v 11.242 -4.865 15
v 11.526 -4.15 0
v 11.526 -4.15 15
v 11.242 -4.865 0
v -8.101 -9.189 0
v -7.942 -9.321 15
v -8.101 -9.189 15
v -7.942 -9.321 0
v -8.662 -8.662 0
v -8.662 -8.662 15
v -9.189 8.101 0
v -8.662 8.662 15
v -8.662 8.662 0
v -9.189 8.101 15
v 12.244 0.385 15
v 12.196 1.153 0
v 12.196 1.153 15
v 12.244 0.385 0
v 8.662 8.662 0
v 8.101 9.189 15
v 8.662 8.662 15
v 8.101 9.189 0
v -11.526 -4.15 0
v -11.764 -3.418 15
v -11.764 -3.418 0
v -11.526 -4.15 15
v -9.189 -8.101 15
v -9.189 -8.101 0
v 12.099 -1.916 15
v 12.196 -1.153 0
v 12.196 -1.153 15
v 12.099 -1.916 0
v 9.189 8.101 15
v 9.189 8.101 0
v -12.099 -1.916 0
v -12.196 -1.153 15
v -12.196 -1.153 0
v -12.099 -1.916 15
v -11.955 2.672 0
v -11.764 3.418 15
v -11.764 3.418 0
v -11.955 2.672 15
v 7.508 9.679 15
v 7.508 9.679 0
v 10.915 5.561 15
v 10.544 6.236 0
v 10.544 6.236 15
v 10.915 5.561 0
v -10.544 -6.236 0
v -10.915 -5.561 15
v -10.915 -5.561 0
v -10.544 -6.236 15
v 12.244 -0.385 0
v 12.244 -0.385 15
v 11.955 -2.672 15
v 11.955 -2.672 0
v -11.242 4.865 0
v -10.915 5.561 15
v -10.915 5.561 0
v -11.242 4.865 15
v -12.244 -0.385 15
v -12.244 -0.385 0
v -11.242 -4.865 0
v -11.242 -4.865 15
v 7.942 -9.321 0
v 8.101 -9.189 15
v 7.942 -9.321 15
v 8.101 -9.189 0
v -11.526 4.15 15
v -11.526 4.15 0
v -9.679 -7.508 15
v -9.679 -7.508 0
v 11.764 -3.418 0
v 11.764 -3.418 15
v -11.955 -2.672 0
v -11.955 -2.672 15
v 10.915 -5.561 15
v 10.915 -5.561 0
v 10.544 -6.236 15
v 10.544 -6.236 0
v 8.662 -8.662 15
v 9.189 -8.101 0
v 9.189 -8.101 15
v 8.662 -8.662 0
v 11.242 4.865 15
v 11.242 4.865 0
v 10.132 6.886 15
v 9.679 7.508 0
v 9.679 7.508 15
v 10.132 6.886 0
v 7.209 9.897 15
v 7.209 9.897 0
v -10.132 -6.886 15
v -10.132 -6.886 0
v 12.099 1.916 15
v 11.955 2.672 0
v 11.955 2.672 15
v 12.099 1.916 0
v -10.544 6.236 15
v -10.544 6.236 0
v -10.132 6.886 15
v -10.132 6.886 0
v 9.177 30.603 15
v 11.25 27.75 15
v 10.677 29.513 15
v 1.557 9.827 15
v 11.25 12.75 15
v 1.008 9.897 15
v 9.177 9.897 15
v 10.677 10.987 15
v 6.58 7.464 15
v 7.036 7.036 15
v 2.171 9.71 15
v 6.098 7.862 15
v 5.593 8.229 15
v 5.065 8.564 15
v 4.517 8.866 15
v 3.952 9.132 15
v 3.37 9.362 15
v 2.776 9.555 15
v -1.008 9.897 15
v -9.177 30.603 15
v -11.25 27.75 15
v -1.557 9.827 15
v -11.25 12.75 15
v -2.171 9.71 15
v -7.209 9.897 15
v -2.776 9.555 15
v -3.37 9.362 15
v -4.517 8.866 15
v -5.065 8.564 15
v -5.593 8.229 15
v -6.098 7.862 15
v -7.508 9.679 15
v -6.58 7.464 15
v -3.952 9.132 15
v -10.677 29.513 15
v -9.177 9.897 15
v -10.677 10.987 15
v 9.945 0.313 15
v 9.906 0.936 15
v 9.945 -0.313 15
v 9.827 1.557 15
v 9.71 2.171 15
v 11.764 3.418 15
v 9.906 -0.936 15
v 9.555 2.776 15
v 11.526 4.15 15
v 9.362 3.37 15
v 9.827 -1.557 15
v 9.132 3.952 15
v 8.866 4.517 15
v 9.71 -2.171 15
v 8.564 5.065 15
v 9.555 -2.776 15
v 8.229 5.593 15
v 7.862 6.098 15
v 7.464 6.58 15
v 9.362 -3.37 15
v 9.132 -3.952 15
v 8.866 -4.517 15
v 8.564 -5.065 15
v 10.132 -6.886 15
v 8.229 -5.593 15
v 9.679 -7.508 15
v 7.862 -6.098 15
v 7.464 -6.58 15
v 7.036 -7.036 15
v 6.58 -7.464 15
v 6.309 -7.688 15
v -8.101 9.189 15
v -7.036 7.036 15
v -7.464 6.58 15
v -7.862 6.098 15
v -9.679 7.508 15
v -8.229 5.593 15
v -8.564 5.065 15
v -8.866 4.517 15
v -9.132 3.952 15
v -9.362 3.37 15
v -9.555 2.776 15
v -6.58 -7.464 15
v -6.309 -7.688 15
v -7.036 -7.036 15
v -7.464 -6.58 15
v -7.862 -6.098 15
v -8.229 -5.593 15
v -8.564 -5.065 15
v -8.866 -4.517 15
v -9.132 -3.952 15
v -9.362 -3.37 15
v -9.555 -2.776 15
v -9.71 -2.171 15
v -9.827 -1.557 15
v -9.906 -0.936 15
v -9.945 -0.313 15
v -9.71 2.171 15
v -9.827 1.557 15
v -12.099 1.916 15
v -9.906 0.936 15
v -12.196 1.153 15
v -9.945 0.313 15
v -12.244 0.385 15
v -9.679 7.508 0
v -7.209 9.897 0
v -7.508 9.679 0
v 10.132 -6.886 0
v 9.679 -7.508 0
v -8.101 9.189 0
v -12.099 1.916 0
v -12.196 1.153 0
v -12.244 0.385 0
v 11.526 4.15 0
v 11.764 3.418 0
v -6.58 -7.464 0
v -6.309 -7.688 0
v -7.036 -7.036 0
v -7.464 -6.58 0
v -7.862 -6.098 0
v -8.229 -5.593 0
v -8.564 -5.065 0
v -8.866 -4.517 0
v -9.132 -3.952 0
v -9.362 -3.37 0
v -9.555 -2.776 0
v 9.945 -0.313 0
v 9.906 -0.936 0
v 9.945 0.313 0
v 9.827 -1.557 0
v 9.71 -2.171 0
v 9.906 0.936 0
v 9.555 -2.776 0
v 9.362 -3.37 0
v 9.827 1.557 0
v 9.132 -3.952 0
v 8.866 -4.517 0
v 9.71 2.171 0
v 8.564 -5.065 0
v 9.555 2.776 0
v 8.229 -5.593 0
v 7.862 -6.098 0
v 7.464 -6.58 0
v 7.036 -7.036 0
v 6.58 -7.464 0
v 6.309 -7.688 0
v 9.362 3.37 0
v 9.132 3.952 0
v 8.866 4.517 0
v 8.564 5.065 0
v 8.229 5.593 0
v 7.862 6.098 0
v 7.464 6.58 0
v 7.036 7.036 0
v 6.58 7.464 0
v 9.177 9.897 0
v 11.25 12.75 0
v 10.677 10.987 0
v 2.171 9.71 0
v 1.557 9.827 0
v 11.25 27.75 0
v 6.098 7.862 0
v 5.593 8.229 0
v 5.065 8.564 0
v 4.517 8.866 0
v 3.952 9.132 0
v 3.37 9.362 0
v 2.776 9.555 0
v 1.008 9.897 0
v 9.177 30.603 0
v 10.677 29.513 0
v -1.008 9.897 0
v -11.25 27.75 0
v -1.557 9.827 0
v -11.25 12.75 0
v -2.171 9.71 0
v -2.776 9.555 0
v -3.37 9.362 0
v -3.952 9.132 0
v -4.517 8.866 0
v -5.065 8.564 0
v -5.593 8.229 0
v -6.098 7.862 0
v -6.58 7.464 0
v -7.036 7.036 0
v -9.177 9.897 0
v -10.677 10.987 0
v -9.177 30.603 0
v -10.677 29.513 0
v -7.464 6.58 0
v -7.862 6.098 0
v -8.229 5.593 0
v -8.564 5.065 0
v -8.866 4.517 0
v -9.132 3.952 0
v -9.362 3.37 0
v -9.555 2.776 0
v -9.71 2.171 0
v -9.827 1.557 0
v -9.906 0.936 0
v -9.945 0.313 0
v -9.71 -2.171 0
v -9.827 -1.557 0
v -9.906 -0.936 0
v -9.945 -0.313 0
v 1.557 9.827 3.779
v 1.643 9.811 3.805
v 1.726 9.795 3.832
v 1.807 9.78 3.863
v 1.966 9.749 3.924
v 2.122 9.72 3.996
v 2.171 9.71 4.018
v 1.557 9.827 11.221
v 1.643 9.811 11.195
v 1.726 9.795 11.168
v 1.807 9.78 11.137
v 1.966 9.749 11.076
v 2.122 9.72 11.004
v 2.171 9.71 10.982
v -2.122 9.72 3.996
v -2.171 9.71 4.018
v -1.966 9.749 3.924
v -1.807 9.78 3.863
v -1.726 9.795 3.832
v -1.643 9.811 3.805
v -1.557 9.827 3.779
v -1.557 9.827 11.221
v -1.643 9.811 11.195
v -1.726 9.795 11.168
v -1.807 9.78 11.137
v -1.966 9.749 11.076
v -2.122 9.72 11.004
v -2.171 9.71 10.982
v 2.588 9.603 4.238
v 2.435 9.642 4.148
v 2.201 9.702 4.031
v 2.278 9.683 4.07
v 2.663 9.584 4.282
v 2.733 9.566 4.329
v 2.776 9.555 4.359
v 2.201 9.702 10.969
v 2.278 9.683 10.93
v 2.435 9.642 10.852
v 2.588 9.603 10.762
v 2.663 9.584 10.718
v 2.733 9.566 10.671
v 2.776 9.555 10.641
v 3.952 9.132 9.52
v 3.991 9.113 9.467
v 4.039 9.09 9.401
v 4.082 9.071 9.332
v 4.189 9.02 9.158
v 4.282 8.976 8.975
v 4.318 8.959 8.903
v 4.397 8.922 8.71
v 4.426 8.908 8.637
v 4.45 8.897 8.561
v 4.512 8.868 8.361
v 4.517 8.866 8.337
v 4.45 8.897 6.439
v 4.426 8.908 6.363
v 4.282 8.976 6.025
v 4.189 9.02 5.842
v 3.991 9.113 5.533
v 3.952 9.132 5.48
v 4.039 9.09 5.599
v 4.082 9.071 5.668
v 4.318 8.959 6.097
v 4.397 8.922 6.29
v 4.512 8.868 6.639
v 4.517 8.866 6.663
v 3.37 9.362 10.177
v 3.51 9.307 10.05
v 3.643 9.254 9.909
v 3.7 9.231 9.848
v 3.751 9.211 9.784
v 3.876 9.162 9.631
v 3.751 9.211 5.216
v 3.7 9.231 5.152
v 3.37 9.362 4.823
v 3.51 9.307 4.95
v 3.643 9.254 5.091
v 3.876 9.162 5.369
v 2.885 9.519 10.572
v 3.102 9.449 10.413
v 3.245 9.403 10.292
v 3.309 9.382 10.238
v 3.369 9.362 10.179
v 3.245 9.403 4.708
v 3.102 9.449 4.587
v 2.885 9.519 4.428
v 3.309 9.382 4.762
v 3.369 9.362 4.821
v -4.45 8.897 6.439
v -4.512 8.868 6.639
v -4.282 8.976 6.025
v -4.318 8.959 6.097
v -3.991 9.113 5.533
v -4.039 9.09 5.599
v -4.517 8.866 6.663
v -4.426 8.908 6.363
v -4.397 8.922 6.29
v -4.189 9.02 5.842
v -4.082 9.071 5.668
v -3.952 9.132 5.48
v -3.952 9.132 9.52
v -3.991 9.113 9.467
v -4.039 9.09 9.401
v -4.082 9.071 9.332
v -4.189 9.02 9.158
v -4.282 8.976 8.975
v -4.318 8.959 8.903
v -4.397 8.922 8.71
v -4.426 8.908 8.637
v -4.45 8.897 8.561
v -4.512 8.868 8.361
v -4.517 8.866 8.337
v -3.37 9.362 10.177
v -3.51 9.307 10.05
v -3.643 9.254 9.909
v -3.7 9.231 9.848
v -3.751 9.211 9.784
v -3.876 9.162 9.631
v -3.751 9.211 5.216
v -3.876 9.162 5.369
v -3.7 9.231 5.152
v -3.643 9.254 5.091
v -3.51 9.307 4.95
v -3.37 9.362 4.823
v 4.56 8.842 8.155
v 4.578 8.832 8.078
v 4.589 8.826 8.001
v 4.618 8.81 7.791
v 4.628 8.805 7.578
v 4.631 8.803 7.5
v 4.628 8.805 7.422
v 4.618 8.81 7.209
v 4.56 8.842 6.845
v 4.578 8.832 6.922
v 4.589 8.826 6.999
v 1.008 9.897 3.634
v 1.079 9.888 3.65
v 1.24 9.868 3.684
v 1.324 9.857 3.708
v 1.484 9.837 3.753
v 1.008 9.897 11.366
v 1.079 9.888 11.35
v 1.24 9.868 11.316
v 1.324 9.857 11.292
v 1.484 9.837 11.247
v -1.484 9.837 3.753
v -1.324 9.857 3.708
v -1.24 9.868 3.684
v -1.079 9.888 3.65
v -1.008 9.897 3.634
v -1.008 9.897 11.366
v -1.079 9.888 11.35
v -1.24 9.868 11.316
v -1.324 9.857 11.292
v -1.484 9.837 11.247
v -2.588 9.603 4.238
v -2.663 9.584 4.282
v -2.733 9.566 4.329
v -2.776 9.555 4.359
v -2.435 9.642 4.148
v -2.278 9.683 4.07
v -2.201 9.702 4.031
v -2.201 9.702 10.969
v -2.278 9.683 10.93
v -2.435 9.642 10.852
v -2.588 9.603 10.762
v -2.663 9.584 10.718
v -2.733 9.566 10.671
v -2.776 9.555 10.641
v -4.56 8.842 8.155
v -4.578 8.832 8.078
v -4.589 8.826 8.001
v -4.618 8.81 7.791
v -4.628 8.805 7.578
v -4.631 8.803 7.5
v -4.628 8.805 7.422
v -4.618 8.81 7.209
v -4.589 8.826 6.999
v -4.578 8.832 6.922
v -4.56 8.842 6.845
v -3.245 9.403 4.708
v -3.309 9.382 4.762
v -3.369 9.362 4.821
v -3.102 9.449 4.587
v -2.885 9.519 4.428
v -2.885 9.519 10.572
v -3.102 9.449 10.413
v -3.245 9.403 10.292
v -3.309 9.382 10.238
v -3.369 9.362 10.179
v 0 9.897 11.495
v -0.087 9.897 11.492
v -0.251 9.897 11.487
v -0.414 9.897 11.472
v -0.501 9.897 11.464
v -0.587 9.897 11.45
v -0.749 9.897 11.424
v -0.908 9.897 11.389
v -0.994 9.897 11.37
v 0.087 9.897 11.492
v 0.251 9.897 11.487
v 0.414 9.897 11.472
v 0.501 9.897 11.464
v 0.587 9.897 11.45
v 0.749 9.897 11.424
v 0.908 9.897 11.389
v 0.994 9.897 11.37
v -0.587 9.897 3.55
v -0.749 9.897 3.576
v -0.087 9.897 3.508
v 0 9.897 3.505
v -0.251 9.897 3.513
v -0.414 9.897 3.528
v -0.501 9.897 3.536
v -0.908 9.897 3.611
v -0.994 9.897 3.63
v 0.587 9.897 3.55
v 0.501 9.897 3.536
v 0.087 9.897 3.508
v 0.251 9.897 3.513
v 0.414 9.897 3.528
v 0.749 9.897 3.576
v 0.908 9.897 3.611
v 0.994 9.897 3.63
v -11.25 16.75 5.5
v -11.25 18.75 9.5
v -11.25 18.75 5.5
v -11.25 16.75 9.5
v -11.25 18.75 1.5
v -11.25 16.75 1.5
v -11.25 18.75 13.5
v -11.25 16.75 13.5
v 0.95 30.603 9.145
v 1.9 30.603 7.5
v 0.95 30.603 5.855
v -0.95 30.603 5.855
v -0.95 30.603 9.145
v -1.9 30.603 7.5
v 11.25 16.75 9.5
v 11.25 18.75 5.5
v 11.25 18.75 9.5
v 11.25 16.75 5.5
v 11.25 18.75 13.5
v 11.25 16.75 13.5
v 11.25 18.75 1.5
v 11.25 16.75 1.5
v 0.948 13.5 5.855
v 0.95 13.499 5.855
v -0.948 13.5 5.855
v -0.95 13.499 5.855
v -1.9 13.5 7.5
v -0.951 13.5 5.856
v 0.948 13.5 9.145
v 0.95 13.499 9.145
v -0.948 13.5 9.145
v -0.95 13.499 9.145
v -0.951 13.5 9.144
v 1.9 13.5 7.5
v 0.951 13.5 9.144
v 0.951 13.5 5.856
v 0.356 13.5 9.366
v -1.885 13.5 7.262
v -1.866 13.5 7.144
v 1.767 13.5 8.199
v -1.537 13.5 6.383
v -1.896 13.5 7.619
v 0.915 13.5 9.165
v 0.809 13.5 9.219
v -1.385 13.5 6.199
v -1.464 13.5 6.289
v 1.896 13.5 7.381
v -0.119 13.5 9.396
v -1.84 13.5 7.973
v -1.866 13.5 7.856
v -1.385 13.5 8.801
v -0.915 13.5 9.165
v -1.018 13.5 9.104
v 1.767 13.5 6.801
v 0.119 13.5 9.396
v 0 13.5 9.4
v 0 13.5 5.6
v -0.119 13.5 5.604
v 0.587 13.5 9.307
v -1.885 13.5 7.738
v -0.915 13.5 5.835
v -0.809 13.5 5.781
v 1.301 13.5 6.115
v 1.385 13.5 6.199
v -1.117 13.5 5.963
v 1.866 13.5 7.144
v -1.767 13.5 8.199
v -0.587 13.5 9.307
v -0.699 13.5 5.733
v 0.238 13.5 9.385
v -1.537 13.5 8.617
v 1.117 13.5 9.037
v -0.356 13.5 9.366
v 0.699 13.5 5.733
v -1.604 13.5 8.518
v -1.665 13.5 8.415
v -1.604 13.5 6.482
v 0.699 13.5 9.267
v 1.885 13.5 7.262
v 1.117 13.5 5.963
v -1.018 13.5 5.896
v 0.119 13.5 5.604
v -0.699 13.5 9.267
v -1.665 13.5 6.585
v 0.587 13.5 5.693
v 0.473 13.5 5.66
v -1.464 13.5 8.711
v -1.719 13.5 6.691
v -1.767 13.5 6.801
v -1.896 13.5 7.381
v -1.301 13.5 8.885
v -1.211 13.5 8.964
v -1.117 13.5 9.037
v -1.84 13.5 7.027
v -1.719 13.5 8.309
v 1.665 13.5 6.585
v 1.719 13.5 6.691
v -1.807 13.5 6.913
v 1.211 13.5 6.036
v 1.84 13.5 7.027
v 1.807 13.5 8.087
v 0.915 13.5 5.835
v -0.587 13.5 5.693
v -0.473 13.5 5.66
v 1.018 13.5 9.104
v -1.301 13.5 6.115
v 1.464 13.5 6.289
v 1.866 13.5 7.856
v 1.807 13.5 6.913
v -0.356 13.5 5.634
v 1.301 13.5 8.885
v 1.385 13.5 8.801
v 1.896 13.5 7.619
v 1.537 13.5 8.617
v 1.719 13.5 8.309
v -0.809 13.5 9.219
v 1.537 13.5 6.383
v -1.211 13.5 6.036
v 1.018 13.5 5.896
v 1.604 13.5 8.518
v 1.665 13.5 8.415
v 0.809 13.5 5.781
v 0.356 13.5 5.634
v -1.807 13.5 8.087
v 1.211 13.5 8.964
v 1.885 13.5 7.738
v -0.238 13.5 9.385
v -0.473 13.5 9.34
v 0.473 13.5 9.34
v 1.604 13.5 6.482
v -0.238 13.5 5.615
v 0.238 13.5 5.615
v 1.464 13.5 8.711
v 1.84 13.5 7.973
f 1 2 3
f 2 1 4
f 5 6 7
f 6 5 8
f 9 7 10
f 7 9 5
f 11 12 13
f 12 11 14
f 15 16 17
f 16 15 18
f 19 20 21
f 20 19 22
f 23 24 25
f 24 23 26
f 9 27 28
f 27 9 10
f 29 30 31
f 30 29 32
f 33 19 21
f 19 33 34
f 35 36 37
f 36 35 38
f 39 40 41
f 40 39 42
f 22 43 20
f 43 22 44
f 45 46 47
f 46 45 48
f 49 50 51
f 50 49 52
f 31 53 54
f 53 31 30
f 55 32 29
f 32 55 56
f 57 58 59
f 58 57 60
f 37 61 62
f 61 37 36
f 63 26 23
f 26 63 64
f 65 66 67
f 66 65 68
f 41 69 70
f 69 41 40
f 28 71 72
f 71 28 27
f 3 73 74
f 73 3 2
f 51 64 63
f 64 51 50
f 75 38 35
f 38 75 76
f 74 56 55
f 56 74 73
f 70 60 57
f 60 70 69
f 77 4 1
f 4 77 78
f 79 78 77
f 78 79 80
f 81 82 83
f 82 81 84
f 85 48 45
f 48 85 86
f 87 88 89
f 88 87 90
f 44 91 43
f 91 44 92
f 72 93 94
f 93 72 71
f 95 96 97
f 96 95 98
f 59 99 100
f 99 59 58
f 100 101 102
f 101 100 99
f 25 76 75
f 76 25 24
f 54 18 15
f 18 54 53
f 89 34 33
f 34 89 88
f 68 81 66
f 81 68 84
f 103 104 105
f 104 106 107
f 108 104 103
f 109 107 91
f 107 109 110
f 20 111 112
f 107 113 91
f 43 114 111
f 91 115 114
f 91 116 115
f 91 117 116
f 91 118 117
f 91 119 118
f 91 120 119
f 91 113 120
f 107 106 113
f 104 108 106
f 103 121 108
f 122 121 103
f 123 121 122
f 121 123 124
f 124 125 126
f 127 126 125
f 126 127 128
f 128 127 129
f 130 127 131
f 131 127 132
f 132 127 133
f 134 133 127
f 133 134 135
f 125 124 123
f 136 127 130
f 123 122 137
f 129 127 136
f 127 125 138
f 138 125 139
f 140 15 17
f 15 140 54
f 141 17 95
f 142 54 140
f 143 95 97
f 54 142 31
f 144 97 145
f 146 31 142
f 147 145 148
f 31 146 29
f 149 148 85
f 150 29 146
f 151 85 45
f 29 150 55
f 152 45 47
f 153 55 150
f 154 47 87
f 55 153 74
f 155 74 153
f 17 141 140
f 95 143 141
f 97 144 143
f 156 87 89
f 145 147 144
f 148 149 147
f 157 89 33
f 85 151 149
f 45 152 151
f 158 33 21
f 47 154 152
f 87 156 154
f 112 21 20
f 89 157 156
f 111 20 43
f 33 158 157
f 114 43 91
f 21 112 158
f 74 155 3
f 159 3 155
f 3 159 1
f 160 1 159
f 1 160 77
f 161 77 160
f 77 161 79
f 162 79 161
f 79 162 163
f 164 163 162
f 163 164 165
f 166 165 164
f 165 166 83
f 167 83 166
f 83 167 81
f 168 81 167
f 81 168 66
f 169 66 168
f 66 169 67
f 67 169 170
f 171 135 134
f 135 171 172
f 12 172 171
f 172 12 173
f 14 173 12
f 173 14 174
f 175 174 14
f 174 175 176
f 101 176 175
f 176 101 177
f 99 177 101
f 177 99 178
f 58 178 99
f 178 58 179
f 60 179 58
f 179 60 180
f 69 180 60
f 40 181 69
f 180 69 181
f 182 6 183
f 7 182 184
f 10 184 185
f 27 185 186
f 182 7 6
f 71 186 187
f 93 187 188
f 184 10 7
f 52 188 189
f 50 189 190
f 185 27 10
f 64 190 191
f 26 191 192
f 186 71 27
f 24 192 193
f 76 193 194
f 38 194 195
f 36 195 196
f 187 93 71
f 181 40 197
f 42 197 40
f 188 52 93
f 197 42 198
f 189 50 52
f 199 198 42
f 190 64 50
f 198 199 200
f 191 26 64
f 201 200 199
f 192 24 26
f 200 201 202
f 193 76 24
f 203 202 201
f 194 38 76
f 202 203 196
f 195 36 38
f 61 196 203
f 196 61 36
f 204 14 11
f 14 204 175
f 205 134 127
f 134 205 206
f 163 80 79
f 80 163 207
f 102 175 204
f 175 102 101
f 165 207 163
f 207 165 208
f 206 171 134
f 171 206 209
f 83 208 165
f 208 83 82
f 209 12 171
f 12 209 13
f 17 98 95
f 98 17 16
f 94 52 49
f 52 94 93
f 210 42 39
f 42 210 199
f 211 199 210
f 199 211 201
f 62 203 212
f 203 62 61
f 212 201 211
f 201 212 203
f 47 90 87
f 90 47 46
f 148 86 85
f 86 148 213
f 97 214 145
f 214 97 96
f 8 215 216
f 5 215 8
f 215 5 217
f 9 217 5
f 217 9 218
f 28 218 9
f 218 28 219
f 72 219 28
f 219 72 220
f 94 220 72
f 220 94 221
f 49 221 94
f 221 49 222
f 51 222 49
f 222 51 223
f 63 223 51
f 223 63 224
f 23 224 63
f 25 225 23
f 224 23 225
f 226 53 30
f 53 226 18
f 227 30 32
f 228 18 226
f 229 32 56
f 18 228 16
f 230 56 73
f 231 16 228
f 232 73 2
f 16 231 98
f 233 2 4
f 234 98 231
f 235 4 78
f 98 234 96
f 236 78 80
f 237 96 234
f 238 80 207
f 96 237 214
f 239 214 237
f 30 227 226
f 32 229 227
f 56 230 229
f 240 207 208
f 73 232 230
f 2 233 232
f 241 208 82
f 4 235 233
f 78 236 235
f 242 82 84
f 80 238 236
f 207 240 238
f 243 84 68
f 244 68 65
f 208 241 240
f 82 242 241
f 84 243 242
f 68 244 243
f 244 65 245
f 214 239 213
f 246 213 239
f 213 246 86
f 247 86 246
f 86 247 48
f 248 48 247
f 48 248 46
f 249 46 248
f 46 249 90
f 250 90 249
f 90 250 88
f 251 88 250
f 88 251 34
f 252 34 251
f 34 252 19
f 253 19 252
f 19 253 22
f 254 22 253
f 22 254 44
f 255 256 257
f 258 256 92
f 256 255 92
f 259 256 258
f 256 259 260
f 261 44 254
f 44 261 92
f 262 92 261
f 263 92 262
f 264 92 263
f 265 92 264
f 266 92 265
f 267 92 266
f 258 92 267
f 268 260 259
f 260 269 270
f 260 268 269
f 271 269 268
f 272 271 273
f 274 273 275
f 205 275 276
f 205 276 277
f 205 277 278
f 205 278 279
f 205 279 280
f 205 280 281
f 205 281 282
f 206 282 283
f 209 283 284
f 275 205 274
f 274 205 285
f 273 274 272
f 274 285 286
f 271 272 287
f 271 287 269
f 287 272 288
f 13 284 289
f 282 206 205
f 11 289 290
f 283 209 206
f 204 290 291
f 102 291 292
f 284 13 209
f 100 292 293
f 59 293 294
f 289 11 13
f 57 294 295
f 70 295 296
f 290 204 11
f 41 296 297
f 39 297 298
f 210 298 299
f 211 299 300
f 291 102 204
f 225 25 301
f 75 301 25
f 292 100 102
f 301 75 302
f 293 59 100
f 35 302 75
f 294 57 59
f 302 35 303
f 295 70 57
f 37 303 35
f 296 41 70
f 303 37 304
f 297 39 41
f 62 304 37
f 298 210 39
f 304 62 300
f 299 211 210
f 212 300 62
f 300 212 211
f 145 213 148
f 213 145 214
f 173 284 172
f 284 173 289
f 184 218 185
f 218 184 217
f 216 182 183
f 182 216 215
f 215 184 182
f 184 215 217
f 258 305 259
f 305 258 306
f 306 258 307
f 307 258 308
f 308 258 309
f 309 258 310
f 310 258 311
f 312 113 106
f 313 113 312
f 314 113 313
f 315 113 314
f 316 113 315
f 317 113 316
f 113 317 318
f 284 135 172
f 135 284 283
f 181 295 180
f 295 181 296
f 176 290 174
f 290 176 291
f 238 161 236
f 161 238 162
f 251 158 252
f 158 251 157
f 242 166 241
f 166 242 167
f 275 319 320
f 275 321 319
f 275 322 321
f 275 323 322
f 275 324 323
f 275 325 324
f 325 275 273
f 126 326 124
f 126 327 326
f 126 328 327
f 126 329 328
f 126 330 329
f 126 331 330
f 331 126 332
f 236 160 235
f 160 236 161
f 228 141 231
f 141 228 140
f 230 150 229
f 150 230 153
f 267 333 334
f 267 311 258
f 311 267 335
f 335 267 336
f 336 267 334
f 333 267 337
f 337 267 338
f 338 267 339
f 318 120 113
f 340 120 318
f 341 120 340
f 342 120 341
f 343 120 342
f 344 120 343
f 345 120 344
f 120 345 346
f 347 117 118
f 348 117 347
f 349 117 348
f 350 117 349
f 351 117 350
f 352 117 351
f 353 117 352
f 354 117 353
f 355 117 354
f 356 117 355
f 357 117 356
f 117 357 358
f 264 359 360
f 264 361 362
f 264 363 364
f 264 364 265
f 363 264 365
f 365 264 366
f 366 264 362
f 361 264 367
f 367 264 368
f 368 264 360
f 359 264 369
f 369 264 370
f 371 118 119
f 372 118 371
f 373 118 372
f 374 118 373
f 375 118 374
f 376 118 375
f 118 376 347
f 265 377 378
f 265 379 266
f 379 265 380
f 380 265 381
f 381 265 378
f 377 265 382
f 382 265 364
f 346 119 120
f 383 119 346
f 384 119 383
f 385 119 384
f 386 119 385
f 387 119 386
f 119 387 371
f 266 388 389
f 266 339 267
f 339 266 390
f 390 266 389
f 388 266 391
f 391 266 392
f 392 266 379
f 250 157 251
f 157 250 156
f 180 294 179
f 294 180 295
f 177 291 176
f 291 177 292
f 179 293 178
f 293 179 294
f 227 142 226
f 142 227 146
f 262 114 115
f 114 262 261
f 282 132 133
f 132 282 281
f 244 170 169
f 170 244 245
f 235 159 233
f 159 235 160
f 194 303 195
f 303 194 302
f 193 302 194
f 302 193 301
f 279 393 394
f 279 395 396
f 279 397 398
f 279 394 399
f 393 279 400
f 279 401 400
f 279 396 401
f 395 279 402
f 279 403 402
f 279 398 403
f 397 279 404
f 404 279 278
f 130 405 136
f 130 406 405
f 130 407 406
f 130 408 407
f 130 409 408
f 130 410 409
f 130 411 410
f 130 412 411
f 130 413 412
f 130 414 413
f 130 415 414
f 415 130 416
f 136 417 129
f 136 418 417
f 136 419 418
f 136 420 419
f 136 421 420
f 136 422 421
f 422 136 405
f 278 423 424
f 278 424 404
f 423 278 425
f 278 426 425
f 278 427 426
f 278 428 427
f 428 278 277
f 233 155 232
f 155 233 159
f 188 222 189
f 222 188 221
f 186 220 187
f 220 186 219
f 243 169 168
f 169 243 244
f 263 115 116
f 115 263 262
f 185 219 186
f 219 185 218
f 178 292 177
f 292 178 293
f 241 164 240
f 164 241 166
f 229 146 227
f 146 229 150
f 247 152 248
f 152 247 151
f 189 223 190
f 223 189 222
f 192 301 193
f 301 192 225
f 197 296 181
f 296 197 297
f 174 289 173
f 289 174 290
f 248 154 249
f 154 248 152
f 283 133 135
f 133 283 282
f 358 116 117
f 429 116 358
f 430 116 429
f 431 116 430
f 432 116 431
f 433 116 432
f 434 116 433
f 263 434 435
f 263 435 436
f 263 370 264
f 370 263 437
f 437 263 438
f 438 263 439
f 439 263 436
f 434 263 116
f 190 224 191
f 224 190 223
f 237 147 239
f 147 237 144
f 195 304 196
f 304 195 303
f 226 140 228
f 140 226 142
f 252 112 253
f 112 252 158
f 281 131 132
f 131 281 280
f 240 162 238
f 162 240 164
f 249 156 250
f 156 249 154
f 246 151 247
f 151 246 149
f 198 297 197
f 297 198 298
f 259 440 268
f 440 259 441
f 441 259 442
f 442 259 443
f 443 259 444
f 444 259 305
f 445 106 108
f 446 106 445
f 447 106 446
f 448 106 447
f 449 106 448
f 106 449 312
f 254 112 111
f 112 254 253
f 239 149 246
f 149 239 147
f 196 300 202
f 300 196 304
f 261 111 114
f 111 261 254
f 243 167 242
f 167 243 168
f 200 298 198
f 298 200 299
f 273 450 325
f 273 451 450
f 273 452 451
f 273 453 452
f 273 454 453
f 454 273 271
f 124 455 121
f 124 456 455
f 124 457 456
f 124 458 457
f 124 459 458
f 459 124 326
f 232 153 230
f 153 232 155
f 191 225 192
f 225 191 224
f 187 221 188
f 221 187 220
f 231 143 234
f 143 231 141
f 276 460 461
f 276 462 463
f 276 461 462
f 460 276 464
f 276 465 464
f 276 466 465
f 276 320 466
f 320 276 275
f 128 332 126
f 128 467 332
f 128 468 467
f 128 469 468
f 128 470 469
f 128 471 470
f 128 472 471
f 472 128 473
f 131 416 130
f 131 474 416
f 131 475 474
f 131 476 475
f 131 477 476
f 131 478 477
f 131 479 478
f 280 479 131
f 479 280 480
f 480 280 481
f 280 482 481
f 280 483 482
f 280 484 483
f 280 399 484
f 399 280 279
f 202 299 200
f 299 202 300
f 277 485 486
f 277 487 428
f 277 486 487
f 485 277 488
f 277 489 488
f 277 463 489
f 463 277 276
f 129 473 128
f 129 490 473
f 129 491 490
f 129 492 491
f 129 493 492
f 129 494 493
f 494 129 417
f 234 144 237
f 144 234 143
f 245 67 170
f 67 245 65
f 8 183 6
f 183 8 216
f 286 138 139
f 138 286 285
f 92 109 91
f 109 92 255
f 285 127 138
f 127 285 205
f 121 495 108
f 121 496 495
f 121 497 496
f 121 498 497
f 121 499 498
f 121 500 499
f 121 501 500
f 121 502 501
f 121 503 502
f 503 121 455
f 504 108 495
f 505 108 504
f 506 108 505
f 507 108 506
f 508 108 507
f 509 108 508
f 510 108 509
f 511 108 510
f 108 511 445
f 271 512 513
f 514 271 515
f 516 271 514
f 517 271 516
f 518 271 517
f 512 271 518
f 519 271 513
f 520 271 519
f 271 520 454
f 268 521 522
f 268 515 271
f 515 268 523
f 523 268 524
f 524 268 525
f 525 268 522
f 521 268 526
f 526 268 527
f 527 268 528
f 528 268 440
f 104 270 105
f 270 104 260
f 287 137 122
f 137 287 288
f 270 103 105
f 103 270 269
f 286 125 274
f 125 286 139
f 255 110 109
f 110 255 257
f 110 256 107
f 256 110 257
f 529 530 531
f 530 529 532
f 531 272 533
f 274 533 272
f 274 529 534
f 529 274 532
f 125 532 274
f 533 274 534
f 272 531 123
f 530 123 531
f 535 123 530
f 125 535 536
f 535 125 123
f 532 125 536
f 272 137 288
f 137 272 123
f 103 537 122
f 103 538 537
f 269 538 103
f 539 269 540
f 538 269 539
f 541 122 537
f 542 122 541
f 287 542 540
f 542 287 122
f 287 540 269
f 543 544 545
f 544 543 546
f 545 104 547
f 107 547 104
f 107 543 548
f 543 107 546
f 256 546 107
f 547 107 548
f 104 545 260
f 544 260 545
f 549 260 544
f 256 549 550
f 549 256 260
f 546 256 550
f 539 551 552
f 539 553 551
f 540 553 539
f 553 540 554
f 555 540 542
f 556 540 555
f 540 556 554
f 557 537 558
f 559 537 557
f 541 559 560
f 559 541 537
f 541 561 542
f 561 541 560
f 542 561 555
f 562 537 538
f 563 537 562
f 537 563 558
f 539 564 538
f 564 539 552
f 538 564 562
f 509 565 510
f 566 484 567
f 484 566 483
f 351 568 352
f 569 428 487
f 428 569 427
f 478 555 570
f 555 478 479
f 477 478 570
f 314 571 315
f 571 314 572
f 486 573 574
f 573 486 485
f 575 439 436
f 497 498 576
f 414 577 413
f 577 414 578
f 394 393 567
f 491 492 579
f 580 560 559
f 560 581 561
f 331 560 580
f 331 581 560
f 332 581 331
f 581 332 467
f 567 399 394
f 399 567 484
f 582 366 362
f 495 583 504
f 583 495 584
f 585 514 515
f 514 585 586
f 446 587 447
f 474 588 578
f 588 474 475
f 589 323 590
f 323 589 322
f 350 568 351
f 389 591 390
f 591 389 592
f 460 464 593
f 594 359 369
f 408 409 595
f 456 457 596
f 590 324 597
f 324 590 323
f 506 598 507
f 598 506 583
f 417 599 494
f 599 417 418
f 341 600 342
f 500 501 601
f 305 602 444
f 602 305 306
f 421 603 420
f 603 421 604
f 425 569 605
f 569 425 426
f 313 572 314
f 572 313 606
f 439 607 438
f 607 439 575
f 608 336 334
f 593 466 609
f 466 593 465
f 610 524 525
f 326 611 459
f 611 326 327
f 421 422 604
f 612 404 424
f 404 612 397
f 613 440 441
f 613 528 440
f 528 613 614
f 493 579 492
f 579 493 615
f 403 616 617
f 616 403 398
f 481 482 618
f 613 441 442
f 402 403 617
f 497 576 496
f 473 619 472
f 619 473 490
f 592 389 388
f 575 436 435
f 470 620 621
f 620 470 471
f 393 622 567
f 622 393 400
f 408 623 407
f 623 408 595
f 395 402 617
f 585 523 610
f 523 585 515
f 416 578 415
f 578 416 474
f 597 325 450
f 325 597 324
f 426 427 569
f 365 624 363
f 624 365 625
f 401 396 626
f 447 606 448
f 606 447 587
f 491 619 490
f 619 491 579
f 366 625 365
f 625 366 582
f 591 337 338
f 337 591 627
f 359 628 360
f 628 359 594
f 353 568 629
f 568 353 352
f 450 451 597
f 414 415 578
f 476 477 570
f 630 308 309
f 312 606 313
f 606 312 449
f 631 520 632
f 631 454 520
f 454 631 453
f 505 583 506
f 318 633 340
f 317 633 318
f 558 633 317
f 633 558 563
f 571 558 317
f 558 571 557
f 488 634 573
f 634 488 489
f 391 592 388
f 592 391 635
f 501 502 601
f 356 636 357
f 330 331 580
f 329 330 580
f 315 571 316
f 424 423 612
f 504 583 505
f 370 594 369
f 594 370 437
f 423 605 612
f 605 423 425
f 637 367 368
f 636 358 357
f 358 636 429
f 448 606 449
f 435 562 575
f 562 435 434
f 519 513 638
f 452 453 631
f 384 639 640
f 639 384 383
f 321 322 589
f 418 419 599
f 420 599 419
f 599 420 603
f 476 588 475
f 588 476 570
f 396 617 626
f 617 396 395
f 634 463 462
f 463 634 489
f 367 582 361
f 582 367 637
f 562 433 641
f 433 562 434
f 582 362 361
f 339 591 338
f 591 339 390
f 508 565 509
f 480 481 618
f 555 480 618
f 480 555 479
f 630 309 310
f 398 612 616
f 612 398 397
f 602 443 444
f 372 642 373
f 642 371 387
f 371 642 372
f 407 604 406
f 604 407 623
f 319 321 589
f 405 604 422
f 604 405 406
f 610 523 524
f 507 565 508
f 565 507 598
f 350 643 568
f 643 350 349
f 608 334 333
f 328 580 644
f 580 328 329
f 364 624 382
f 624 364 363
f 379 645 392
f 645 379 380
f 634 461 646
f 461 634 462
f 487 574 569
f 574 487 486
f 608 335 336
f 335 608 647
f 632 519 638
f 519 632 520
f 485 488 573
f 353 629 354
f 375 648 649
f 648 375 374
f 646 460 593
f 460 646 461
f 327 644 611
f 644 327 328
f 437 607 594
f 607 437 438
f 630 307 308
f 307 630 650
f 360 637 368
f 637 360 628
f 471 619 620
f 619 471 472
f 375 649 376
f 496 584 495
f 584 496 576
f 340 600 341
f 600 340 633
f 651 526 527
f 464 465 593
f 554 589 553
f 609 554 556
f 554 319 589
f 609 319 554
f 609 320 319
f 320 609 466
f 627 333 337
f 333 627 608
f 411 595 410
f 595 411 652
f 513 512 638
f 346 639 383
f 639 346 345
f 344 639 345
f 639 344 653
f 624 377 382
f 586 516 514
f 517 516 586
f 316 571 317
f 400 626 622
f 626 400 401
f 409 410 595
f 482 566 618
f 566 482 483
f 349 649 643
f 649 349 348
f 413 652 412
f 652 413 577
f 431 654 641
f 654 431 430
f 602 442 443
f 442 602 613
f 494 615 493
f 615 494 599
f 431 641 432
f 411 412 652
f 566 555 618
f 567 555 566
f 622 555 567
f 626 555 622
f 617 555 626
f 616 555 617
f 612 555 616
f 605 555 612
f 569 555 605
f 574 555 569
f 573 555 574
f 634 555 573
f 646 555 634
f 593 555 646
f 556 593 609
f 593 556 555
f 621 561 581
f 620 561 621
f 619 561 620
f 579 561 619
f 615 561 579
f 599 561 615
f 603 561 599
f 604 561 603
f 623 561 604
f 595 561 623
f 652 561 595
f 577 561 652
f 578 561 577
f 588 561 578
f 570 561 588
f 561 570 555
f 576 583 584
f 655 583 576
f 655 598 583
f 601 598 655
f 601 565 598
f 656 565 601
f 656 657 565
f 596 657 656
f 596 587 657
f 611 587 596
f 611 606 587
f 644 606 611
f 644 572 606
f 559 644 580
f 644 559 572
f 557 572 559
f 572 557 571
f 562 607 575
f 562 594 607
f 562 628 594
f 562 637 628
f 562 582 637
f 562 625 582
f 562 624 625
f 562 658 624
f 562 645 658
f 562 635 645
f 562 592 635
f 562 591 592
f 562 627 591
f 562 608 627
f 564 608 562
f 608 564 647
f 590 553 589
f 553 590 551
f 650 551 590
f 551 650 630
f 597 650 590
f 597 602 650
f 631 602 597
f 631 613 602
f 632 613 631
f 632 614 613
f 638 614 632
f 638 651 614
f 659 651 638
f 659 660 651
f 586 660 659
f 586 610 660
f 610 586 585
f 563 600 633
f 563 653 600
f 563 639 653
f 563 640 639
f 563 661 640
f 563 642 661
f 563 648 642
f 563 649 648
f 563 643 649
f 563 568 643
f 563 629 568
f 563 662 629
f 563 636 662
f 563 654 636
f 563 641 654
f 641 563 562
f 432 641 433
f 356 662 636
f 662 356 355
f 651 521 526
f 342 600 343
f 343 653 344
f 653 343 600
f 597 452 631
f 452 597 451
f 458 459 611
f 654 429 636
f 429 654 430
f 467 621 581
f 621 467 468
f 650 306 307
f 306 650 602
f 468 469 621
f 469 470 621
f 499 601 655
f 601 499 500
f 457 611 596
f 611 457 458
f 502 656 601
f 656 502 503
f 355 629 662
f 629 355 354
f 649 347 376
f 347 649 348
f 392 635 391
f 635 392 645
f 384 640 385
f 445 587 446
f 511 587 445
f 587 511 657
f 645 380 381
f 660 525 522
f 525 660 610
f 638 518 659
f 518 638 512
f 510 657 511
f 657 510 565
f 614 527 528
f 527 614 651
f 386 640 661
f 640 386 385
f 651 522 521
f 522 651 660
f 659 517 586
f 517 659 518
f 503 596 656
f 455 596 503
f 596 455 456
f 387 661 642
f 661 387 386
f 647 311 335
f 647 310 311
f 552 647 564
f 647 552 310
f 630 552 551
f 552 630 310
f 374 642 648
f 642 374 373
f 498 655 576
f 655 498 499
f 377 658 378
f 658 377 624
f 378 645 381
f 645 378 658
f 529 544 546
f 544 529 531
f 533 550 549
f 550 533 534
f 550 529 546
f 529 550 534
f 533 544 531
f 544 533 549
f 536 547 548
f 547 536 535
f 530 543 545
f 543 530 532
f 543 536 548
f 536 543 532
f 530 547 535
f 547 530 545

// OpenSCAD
// clip to hold pipe (or shelving) off the wall at fixed distance
// Alexander Hulpke, 12/2014

// Diameter Of Held Pipe (mm)
pipe_diameter=19.5;

// Clip-wall Thickness (mm)
thick=2.5;

// Height Of Clip (mm)
height=15;

// Distance The Pipe Should Be Kept From Wall (mm)
wall_distance=18;

// Radius Of Rounded Corner (mm)
corner_radius=3;

// Radius Of Screw Hole (mm)
hole_radius=1.9;

// Rendering Fineness ($fn)
fineness=100;

//rotate for nicer view
rotate(a=180,v=[0,0,1]) {
difference() {
  union(){
rotate(a=45,v=[0,0,1]) {difference() {
  cylinder(r=pipe_diameter/2+thick,h=height,$fn=fineness);
  cylinder(r=pipe_diameter/2+0.2,h=height,$fn=fineness);
  translate(v=[pipe_diameter/20,pipe_diameter/20,0]) {cube(pipe_diameter);}
}}
  translate(v=[-pipe_diameter/2+corner_radius/2,-pipe_diameter/2-wall_distance,0]) {
    minkowski() {
      cube(size=[pipe_diameter-corner_radius,wall_distance-corner_radius,height/2]);
      cylinder(r=corner_radius,h=height/2);
    }
  }
}
  translate(v=[0,0,height/2]) {
   rotate(a=90,v=[1,0,0]) {
     cylinder(r=hole_radius,h=pipe_diameter+wall_distance);
     cylinder(r1=pipe_diameter/2,r2=hole_radius,h=pipe_diameter/2+1.5*thick,$fn=fineness);
   }}
  translate(v=[-0.75*pipe_diameter,-pipe_diameter/2-3*corner_radius,height/3-3.5])  cube(size=[1.5*pipe_diameter,2,4]);
  translate(v=[-0.75*pipe_diameter,-pipe_diameter/2-3*corner_radius,2*height/3-0.5])  cube(size=[1.5*pipe_diameter,2,4]);
}
}
